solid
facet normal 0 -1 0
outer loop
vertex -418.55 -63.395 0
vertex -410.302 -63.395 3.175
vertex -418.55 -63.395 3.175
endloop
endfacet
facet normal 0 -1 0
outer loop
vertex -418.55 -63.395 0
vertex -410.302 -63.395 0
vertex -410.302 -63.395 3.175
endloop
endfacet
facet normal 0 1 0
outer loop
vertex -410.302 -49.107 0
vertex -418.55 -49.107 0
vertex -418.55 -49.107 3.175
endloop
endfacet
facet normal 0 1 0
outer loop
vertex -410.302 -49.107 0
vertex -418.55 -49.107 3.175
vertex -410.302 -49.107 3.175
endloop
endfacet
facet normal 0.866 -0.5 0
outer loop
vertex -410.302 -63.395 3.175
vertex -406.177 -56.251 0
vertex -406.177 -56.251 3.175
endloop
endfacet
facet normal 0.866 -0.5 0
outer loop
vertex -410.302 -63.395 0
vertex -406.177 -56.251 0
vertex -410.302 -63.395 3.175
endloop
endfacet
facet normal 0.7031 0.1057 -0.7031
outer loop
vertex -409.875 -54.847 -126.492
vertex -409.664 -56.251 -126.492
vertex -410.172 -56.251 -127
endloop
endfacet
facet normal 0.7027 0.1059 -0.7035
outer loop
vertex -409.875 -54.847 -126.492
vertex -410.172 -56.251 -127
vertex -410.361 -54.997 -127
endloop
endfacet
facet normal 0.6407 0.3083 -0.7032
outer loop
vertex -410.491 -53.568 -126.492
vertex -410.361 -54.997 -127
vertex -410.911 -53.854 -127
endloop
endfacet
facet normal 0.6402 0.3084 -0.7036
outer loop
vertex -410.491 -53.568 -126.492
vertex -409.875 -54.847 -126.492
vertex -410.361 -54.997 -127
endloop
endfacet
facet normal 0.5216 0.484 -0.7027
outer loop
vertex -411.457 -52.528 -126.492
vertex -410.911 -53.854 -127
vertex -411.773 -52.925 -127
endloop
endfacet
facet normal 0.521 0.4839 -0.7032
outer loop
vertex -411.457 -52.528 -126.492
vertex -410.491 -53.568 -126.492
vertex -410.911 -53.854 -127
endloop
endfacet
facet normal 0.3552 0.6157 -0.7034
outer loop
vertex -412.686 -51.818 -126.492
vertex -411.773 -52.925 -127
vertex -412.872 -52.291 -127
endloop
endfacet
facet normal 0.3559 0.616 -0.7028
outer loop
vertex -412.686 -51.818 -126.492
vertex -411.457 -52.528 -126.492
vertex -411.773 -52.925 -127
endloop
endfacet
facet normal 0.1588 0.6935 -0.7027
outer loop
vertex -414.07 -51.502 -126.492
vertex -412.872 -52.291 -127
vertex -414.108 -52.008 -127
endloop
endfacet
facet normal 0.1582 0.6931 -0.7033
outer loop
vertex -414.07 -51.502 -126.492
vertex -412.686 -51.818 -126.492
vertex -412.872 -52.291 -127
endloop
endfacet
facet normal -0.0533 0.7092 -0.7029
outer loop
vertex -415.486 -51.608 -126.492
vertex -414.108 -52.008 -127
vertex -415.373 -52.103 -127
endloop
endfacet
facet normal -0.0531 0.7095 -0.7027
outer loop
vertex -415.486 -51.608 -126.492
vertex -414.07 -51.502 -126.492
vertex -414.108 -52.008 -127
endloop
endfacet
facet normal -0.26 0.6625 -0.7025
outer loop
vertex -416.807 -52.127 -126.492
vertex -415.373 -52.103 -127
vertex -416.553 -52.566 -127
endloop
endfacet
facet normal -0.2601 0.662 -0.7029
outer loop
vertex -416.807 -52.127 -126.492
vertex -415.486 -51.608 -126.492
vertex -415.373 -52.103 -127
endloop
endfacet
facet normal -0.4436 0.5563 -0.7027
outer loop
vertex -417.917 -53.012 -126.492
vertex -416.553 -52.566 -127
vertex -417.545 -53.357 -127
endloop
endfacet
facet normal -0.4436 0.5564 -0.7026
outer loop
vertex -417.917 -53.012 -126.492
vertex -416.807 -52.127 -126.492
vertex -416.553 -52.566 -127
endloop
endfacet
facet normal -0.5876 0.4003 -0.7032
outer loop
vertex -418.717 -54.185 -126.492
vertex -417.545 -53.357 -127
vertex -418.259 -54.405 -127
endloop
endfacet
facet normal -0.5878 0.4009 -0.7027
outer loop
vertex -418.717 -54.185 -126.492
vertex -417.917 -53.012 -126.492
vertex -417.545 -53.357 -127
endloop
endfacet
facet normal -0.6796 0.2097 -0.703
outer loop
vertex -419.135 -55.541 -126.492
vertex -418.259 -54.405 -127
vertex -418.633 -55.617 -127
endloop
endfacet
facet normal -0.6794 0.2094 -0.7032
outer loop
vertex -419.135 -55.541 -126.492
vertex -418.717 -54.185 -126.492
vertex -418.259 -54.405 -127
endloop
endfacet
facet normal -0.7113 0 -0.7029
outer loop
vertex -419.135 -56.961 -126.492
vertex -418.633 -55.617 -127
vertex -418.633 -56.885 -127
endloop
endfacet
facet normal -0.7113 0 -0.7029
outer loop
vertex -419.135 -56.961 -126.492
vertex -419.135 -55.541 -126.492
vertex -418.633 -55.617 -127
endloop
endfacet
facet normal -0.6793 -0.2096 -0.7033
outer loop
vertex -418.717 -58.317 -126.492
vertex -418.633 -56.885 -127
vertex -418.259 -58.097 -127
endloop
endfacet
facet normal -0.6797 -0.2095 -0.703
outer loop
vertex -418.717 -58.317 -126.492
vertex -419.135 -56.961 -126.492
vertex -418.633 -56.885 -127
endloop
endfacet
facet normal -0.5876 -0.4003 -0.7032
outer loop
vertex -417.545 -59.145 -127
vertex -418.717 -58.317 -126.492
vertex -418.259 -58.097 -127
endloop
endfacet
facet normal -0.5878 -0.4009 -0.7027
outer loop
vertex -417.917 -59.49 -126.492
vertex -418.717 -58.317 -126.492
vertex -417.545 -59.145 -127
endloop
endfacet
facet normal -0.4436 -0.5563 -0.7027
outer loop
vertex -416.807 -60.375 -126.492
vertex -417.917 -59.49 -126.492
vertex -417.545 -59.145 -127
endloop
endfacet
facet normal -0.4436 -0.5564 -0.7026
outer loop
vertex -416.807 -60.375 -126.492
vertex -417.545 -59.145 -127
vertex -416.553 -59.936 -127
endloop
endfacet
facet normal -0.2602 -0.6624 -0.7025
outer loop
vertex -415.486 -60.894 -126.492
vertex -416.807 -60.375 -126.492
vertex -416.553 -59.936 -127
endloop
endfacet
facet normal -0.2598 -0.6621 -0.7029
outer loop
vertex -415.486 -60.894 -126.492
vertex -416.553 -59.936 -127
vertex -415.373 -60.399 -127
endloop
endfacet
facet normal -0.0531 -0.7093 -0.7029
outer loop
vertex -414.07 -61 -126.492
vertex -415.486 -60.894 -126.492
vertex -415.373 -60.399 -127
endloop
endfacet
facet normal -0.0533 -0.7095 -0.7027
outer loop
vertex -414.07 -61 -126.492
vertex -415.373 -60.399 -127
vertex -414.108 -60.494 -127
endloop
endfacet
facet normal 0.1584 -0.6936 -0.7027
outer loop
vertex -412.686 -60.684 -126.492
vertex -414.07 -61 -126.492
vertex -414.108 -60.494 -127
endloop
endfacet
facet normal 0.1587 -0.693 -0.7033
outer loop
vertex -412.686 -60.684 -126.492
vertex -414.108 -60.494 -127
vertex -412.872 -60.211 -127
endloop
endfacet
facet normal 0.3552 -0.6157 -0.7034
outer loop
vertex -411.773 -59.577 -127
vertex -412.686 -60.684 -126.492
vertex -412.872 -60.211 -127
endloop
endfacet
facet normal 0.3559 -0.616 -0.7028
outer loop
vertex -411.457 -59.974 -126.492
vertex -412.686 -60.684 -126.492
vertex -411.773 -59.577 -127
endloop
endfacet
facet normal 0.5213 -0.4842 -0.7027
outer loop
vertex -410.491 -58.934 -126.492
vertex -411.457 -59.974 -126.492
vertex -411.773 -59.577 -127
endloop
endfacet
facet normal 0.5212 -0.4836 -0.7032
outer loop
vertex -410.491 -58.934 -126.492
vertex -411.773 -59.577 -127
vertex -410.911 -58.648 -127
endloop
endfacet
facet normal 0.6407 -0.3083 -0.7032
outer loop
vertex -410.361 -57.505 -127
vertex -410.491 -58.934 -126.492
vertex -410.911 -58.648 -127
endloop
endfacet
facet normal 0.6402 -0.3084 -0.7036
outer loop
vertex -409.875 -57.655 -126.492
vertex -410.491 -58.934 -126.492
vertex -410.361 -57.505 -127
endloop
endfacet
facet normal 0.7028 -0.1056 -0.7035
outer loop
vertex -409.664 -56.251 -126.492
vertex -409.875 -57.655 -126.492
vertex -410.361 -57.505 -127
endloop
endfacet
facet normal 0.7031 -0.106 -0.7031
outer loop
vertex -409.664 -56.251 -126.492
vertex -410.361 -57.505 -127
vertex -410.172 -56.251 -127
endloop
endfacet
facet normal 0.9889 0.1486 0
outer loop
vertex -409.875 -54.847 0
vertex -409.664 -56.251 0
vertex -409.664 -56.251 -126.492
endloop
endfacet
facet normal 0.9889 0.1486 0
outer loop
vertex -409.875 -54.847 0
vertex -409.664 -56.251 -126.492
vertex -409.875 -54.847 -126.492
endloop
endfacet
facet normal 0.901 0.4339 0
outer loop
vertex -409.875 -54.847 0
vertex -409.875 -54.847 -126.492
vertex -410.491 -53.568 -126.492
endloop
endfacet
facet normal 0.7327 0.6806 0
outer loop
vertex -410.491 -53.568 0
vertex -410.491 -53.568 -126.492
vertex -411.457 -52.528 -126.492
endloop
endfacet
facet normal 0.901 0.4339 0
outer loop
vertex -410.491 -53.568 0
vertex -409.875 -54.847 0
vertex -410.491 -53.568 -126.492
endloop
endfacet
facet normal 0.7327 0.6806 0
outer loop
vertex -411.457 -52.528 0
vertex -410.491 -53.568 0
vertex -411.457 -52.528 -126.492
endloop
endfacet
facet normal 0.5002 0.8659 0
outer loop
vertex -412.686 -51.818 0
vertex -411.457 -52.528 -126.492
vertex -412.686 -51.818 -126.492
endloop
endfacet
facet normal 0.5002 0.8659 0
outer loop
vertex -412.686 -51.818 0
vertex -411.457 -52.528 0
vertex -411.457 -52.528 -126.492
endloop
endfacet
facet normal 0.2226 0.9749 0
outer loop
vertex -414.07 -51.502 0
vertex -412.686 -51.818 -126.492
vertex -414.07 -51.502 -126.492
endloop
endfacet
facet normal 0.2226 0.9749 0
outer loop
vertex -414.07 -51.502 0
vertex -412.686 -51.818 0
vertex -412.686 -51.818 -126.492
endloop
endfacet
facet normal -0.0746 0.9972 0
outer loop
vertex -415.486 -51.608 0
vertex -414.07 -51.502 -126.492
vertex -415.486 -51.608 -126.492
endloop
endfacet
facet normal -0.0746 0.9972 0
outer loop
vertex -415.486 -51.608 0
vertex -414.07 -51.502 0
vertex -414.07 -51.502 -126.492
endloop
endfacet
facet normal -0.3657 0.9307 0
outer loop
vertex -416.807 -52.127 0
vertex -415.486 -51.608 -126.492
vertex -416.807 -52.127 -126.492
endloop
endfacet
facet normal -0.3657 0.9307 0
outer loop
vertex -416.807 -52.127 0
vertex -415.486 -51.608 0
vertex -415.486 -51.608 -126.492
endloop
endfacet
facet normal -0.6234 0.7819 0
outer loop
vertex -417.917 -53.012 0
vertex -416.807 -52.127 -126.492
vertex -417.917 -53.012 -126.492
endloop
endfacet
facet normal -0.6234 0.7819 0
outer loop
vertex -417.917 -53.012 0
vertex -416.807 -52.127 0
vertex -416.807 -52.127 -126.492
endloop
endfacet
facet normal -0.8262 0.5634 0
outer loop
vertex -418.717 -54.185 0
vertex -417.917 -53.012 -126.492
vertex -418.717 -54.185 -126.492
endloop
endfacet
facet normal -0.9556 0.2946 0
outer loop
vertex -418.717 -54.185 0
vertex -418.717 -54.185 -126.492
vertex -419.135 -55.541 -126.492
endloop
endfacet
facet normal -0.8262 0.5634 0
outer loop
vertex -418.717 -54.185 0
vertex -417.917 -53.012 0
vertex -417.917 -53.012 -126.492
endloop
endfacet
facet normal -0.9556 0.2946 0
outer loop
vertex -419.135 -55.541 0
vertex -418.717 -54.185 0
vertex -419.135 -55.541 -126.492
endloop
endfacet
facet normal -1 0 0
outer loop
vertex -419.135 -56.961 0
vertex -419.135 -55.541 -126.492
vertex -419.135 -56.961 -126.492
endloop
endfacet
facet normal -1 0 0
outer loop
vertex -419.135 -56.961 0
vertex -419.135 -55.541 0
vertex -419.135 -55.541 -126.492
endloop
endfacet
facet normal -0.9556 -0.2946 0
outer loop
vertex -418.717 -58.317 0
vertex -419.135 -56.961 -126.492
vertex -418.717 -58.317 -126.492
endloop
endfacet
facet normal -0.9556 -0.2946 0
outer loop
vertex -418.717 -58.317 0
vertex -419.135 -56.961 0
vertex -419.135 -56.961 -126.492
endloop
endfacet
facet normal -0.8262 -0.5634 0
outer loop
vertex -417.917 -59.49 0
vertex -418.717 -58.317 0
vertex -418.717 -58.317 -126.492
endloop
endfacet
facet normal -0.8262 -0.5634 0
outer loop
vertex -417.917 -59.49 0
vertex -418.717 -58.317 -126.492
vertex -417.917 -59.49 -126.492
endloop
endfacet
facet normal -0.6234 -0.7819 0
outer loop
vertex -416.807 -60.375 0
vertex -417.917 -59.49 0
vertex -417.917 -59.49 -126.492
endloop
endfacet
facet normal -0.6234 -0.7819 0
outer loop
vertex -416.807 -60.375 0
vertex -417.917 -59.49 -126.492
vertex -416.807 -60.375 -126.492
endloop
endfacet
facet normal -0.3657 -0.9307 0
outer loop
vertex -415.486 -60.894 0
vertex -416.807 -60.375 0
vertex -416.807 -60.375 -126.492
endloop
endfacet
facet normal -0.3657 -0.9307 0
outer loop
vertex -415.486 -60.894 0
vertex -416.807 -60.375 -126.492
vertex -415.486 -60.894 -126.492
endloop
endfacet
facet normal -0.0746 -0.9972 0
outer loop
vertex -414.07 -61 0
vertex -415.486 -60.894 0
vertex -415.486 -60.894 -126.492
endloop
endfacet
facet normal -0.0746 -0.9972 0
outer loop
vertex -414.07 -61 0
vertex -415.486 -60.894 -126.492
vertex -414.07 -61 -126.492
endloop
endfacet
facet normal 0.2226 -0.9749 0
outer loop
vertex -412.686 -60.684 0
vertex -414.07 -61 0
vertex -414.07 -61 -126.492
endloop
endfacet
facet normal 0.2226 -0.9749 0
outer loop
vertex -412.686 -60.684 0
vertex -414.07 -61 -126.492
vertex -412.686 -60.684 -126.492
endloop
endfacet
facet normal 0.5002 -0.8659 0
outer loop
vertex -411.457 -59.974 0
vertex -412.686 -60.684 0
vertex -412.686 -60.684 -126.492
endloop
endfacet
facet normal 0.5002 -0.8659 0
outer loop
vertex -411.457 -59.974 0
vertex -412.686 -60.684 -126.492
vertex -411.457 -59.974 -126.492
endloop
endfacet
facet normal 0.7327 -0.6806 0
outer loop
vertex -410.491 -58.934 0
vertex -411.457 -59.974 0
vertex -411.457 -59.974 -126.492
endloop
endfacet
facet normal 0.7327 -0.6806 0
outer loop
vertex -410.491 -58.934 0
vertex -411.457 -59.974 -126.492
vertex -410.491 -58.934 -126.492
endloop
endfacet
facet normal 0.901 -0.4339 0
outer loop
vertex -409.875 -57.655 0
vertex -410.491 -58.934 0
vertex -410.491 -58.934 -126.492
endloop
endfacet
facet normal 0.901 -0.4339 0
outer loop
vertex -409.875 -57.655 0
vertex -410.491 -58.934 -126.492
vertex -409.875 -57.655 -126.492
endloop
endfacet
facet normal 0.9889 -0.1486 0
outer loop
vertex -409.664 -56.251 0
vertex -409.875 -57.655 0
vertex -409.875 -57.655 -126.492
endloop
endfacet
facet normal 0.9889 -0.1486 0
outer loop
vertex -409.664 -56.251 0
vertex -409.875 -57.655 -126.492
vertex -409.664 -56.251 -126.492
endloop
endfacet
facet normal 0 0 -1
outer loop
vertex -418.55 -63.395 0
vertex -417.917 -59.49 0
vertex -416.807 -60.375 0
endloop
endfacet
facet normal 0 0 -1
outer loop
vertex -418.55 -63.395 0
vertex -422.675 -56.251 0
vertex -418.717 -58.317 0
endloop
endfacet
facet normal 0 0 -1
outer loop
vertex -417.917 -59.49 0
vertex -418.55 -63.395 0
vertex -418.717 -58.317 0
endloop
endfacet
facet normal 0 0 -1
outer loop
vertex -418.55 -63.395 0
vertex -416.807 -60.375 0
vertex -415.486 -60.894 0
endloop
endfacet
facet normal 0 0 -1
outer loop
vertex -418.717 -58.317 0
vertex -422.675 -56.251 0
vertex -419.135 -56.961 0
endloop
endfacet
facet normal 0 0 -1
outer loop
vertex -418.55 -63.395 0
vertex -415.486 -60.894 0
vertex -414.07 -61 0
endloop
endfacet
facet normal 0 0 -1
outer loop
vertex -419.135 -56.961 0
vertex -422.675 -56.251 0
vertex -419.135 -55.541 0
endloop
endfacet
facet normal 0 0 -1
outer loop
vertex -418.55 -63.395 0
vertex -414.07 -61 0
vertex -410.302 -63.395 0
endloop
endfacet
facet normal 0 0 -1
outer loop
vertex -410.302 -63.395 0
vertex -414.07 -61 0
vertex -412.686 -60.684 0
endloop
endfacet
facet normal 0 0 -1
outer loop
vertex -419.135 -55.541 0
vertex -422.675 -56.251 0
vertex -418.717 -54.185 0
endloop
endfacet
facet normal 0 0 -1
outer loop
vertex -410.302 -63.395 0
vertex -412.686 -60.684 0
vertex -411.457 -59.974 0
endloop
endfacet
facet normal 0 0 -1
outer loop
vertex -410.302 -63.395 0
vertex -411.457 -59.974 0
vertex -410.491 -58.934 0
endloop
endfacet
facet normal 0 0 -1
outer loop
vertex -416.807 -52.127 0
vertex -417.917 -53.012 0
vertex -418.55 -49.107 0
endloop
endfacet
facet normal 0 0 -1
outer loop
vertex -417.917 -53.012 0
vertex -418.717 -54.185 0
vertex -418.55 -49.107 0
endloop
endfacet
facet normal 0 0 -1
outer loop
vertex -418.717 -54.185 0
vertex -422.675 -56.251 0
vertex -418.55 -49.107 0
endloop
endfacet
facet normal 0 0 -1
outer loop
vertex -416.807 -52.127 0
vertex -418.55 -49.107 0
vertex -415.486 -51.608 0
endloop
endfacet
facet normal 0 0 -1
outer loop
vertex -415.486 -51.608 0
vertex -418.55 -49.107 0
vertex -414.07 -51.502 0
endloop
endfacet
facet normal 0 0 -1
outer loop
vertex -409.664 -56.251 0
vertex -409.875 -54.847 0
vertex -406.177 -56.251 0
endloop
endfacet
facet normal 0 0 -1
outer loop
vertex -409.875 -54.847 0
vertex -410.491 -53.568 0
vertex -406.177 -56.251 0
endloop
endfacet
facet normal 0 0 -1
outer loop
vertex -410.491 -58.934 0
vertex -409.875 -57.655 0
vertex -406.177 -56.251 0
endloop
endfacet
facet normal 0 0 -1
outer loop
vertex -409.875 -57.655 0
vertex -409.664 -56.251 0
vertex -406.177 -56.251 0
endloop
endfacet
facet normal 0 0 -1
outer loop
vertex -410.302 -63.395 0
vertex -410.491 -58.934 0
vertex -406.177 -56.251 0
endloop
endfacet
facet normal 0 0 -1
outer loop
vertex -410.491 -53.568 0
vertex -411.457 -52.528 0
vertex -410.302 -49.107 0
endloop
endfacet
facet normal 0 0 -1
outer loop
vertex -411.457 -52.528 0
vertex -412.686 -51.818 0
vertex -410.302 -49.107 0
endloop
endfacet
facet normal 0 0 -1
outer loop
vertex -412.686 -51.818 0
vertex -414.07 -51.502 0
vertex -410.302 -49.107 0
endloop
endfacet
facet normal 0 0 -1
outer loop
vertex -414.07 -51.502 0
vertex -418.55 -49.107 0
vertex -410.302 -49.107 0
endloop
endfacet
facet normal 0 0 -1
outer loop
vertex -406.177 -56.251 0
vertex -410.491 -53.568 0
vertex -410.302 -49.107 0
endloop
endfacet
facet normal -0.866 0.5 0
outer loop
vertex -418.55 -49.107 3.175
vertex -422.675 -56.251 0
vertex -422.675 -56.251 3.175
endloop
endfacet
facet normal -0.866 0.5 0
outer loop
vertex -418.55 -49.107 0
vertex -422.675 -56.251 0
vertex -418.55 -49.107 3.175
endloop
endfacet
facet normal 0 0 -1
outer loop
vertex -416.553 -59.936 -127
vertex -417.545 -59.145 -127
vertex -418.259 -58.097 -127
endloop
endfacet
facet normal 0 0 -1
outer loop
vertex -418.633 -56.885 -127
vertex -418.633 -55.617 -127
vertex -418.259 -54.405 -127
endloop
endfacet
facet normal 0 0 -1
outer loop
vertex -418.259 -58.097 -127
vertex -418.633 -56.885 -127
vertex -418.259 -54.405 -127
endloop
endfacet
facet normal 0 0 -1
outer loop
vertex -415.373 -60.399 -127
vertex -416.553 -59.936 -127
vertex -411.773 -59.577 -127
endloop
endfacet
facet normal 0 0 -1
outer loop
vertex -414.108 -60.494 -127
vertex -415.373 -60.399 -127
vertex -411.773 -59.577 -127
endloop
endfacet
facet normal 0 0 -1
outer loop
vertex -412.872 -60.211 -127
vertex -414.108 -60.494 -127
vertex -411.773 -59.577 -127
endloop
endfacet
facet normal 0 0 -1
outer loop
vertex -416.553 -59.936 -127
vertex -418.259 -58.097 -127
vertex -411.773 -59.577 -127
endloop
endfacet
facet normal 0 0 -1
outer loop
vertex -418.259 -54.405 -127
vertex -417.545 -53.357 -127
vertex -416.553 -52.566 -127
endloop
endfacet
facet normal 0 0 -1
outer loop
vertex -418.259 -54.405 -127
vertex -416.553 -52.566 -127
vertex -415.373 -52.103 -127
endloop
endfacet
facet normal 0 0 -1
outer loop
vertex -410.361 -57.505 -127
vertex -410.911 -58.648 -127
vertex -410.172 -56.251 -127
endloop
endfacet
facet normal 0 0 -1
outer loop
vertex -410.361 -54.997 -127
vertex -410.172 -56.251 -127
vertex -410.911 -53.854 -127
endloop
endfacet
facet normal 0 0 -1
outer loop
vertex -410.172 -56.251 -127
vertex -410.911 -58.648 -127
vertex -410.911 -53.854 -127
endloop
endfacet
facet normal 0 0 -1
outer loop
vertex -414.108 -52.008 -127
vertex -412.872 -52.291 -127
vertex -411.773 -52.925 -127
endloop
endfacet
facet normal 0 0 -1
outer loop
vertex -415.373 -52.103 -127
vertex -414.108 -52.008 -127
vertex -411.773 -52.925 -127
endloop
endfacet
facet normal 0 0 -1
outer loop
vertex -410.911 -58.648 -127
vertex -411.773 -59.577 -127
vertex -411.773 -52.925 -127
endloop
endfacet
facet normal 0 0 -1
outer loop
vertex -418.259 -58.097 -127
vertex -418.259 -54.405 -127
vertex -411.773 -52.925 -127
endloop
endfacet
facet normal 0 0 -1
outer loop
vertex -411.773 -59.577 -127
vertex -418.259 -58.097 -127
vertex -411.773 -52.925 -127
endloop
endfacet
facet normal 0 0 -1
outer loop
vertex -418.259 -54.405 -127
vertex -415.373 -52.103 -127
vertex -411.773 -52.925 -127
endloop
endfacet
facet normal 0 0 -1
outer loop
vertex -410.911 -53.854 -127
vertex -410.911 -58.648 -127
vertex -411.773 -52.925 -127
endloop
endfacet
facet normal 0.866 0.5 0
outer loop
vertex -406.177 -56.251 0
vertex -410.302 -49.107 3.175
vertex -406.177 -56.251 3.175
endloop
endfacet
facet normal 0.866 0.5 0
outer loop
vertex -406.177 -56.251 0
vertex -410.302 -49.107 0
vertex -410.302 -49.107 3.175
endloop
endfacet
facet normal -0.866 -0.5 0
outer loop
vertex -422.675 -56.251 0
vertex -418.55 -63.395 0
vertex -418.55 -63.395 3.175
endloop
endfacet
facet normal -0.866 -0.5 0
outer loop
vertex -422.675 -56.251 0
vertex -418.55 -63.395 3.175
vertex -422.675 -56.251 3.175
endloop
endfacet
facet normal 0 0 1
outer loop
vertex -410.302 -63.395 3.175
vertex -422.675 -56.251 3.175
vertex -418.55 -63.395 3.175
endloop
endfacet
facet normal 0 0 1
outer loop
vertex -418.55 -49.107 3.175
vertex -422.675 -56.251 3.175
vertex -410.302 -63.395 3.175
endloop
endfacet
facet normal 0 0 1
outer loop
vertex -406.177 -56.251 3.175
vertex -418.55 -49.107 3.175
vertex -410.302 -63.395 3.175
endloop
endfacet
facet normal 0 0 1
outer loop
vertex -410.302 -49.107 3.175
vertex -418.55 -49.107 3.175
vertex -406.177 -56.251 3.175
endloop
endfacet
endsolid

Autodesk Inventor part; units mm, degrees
ref_plane "YZ Plane" through (0, 0, 0) normal (1, 0, 0) x (0, 1, 0)
ref_plane "XZ Plane" through (0, 0, 0) normal (0, 1, 0) x (-1, 0, 0)
ref_plane "XY Plane" through (0, 0, 0) normal (0, 0, 1) x (1, 0, 0)
sketch "Sketch1" plane through (0, 0, 0) normal (0, 0, 1) x (1, 0, 0)
  circle A0 centre (-414.4261, -56.251) radius 4.7625
  point P0 (0, 0)
  dimension "d0" = 9.525
extrude "Extrusion1" add sketch "Sketch1" against normal blind 127
sketch "Sketch2" plane through (-414.4261, -56.251, 0) normal (0, 0, 1) x (1, 0, 0)
  circle A0 centre (0, 0) radius 4.7625 projected
  line L0 (-8.2489, 0) -> (-4.1244, 7.1437)
  line L1 (-4.1244, 7.1437) -> (4.1244, 7.1438)
  line L2 (4.1244, 7.1438) -> (8.2489, 0)
  line L3 (8.2489, 0) -> (4.1244, -7.1437)
  line L4 (4.1244, -7.1437) -> (-4.1244, -7.1438)
  line L5 (-4.1244, -7.1438) -> (-8.2489, 0)
  point P0 (414.4261, 56.251)
  dimension "d3" = 14.2875
extrude "Extrusion2" add sketch "Sketch2" along normal blind 3.175 contours A0 | L0 L1 L2 L3 L4 L5
thread "Thread1" size "3/8-16 UNC" class "2A" standard "ANSI Unified Screw Threads" length 25.4
chamfer "Chamfer1" distance 0.508 angle 45 1 edges at (-419.1886, -56.251, -127)
properties part number "375 bolt x4" material "Steel"
